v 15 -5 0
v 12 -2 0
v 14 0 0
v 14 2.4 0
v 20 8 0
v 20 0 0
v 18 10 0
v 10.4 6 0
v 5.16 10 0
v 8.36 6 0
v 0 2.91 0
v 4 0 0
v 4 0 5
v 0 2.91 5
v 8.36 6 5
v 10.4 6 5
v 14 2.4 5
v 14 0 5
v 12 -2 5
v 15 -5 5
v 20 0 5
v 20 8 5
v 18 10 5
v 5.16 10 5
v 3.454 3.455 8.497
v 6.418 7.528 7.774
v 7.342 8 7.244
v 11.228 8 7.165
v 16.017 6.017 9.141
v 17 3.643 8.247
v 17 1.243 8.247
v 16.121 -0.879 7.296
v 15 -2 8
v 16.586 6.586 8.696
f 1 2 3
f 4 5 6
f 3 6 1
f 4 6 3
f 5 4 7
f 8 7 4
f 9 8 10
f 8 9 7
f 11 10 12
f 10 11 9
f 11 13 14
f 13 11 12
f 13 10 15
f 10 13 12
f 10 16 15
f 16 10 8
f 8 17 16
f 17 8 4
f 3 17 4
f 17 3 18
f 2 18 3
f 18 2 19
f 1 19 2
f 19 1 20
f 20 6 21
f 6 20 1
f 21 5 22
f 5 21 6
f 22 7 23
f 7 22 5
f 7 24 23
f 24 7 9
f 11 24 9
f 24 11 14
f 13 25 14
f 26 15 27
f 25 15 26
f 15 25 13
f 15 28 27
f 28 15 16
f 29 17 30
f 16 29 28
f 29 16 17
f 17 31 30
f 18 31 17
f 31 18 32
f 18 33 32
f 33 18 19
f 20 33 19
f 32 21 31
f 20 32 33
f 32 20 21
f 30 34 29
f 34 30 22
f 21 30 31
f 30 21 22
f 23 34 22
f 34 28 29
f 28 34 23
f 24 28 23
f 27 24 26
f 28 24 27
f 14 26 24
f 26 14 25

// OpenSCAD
CubePoints = [
[0.0, 2.91, 0.0],
[4.0, 0.0, 0.0],
[8.36, 6.0, 0.0],
[10.4, 6.0, 0.0],
[14.0, 2.4, 0.0],
[14.0, 0.0, 0.0],
[12.0, -2.0, 0.0],
[15.0, -5.0, 0.0],
[20.0, 0.0, 0.0],
[20.0, 8.0, 0.0],
[18.0, 10.0, 0.0],
[5.16, 10.0, 0.0],
[0.0, 2.91, 5.0],
[4.0, 0.0, 5.0],
[8.36, 6.0, 5.0],
[10.4, 6.0, 5.0],
[14.0, 2.4, 5.0],
[14.0, 0.0, 5.0],
[12.0, -2.0, 5.0],
[15.0, -5.0, 5.0],
[20.0, 0.0, 5.0],
[20.0, 8.0, 5.0],
[18.0, 10.0, 5.0],
[5.16, 10.0, 5.0],
[3.4541092259287667, 3.4545289552869995, 8.497394321510283],
[15.0, -2.0, 8.0],
[16.585786437626904, 6.585786437626908, 8.695518130045144],
[6.418462978159132, 7.527642928797327, 7.774216746204775],
[16.121320343559642, -0.8786796564403572, 7.296100594190538],
[7.341811768050446, 8.0, 7.244260964255394],
[17.0, 1.2426406871192857, 8.247176600877182],
[11.228427124746192, 8.0, 7.164784400584788],
[17.0, 3.6426406871192842, 8.247176600877182],
[16.016652224137044, 6.016652224137047, 9.1409008082146]];

CubeFaces = [
[0, 1, 2, 3, 4, 5, 6, 7, 8, 9, 10, 11],
[0, 12, 13, 1],
[1, 13, 14, 2],
[2, 14, 15, 3],
[3, 15, 16, 4],
[4, 16, 17, 5],
[5, 17, 18, 6],
[6, 18, 19, 7],
[7, 19, 20, 8],
[8, 20, 21, 9],
[9, 21, 22, 10],
[10, 22, 23, 11],
[11, 23, 12, 0],
[12, 24, 13],
[13, 24, 27, 29, 14],
[14, 29, 31, 15],
[15, 31, 33, 32, 16],
[16, 32, 30, 28, 17],
[17, 28, 25, 18],
[18, 25, 19],
[19, 25, 28, 30, 20],
[20, 30, 32, 33, 26, 21],
[21, 26, 22],
[22, 26, 33, 31, 29, 27, 23],
[23, 27, 24, 12]];

polyhedron( CubePoints, CubeFaces );
